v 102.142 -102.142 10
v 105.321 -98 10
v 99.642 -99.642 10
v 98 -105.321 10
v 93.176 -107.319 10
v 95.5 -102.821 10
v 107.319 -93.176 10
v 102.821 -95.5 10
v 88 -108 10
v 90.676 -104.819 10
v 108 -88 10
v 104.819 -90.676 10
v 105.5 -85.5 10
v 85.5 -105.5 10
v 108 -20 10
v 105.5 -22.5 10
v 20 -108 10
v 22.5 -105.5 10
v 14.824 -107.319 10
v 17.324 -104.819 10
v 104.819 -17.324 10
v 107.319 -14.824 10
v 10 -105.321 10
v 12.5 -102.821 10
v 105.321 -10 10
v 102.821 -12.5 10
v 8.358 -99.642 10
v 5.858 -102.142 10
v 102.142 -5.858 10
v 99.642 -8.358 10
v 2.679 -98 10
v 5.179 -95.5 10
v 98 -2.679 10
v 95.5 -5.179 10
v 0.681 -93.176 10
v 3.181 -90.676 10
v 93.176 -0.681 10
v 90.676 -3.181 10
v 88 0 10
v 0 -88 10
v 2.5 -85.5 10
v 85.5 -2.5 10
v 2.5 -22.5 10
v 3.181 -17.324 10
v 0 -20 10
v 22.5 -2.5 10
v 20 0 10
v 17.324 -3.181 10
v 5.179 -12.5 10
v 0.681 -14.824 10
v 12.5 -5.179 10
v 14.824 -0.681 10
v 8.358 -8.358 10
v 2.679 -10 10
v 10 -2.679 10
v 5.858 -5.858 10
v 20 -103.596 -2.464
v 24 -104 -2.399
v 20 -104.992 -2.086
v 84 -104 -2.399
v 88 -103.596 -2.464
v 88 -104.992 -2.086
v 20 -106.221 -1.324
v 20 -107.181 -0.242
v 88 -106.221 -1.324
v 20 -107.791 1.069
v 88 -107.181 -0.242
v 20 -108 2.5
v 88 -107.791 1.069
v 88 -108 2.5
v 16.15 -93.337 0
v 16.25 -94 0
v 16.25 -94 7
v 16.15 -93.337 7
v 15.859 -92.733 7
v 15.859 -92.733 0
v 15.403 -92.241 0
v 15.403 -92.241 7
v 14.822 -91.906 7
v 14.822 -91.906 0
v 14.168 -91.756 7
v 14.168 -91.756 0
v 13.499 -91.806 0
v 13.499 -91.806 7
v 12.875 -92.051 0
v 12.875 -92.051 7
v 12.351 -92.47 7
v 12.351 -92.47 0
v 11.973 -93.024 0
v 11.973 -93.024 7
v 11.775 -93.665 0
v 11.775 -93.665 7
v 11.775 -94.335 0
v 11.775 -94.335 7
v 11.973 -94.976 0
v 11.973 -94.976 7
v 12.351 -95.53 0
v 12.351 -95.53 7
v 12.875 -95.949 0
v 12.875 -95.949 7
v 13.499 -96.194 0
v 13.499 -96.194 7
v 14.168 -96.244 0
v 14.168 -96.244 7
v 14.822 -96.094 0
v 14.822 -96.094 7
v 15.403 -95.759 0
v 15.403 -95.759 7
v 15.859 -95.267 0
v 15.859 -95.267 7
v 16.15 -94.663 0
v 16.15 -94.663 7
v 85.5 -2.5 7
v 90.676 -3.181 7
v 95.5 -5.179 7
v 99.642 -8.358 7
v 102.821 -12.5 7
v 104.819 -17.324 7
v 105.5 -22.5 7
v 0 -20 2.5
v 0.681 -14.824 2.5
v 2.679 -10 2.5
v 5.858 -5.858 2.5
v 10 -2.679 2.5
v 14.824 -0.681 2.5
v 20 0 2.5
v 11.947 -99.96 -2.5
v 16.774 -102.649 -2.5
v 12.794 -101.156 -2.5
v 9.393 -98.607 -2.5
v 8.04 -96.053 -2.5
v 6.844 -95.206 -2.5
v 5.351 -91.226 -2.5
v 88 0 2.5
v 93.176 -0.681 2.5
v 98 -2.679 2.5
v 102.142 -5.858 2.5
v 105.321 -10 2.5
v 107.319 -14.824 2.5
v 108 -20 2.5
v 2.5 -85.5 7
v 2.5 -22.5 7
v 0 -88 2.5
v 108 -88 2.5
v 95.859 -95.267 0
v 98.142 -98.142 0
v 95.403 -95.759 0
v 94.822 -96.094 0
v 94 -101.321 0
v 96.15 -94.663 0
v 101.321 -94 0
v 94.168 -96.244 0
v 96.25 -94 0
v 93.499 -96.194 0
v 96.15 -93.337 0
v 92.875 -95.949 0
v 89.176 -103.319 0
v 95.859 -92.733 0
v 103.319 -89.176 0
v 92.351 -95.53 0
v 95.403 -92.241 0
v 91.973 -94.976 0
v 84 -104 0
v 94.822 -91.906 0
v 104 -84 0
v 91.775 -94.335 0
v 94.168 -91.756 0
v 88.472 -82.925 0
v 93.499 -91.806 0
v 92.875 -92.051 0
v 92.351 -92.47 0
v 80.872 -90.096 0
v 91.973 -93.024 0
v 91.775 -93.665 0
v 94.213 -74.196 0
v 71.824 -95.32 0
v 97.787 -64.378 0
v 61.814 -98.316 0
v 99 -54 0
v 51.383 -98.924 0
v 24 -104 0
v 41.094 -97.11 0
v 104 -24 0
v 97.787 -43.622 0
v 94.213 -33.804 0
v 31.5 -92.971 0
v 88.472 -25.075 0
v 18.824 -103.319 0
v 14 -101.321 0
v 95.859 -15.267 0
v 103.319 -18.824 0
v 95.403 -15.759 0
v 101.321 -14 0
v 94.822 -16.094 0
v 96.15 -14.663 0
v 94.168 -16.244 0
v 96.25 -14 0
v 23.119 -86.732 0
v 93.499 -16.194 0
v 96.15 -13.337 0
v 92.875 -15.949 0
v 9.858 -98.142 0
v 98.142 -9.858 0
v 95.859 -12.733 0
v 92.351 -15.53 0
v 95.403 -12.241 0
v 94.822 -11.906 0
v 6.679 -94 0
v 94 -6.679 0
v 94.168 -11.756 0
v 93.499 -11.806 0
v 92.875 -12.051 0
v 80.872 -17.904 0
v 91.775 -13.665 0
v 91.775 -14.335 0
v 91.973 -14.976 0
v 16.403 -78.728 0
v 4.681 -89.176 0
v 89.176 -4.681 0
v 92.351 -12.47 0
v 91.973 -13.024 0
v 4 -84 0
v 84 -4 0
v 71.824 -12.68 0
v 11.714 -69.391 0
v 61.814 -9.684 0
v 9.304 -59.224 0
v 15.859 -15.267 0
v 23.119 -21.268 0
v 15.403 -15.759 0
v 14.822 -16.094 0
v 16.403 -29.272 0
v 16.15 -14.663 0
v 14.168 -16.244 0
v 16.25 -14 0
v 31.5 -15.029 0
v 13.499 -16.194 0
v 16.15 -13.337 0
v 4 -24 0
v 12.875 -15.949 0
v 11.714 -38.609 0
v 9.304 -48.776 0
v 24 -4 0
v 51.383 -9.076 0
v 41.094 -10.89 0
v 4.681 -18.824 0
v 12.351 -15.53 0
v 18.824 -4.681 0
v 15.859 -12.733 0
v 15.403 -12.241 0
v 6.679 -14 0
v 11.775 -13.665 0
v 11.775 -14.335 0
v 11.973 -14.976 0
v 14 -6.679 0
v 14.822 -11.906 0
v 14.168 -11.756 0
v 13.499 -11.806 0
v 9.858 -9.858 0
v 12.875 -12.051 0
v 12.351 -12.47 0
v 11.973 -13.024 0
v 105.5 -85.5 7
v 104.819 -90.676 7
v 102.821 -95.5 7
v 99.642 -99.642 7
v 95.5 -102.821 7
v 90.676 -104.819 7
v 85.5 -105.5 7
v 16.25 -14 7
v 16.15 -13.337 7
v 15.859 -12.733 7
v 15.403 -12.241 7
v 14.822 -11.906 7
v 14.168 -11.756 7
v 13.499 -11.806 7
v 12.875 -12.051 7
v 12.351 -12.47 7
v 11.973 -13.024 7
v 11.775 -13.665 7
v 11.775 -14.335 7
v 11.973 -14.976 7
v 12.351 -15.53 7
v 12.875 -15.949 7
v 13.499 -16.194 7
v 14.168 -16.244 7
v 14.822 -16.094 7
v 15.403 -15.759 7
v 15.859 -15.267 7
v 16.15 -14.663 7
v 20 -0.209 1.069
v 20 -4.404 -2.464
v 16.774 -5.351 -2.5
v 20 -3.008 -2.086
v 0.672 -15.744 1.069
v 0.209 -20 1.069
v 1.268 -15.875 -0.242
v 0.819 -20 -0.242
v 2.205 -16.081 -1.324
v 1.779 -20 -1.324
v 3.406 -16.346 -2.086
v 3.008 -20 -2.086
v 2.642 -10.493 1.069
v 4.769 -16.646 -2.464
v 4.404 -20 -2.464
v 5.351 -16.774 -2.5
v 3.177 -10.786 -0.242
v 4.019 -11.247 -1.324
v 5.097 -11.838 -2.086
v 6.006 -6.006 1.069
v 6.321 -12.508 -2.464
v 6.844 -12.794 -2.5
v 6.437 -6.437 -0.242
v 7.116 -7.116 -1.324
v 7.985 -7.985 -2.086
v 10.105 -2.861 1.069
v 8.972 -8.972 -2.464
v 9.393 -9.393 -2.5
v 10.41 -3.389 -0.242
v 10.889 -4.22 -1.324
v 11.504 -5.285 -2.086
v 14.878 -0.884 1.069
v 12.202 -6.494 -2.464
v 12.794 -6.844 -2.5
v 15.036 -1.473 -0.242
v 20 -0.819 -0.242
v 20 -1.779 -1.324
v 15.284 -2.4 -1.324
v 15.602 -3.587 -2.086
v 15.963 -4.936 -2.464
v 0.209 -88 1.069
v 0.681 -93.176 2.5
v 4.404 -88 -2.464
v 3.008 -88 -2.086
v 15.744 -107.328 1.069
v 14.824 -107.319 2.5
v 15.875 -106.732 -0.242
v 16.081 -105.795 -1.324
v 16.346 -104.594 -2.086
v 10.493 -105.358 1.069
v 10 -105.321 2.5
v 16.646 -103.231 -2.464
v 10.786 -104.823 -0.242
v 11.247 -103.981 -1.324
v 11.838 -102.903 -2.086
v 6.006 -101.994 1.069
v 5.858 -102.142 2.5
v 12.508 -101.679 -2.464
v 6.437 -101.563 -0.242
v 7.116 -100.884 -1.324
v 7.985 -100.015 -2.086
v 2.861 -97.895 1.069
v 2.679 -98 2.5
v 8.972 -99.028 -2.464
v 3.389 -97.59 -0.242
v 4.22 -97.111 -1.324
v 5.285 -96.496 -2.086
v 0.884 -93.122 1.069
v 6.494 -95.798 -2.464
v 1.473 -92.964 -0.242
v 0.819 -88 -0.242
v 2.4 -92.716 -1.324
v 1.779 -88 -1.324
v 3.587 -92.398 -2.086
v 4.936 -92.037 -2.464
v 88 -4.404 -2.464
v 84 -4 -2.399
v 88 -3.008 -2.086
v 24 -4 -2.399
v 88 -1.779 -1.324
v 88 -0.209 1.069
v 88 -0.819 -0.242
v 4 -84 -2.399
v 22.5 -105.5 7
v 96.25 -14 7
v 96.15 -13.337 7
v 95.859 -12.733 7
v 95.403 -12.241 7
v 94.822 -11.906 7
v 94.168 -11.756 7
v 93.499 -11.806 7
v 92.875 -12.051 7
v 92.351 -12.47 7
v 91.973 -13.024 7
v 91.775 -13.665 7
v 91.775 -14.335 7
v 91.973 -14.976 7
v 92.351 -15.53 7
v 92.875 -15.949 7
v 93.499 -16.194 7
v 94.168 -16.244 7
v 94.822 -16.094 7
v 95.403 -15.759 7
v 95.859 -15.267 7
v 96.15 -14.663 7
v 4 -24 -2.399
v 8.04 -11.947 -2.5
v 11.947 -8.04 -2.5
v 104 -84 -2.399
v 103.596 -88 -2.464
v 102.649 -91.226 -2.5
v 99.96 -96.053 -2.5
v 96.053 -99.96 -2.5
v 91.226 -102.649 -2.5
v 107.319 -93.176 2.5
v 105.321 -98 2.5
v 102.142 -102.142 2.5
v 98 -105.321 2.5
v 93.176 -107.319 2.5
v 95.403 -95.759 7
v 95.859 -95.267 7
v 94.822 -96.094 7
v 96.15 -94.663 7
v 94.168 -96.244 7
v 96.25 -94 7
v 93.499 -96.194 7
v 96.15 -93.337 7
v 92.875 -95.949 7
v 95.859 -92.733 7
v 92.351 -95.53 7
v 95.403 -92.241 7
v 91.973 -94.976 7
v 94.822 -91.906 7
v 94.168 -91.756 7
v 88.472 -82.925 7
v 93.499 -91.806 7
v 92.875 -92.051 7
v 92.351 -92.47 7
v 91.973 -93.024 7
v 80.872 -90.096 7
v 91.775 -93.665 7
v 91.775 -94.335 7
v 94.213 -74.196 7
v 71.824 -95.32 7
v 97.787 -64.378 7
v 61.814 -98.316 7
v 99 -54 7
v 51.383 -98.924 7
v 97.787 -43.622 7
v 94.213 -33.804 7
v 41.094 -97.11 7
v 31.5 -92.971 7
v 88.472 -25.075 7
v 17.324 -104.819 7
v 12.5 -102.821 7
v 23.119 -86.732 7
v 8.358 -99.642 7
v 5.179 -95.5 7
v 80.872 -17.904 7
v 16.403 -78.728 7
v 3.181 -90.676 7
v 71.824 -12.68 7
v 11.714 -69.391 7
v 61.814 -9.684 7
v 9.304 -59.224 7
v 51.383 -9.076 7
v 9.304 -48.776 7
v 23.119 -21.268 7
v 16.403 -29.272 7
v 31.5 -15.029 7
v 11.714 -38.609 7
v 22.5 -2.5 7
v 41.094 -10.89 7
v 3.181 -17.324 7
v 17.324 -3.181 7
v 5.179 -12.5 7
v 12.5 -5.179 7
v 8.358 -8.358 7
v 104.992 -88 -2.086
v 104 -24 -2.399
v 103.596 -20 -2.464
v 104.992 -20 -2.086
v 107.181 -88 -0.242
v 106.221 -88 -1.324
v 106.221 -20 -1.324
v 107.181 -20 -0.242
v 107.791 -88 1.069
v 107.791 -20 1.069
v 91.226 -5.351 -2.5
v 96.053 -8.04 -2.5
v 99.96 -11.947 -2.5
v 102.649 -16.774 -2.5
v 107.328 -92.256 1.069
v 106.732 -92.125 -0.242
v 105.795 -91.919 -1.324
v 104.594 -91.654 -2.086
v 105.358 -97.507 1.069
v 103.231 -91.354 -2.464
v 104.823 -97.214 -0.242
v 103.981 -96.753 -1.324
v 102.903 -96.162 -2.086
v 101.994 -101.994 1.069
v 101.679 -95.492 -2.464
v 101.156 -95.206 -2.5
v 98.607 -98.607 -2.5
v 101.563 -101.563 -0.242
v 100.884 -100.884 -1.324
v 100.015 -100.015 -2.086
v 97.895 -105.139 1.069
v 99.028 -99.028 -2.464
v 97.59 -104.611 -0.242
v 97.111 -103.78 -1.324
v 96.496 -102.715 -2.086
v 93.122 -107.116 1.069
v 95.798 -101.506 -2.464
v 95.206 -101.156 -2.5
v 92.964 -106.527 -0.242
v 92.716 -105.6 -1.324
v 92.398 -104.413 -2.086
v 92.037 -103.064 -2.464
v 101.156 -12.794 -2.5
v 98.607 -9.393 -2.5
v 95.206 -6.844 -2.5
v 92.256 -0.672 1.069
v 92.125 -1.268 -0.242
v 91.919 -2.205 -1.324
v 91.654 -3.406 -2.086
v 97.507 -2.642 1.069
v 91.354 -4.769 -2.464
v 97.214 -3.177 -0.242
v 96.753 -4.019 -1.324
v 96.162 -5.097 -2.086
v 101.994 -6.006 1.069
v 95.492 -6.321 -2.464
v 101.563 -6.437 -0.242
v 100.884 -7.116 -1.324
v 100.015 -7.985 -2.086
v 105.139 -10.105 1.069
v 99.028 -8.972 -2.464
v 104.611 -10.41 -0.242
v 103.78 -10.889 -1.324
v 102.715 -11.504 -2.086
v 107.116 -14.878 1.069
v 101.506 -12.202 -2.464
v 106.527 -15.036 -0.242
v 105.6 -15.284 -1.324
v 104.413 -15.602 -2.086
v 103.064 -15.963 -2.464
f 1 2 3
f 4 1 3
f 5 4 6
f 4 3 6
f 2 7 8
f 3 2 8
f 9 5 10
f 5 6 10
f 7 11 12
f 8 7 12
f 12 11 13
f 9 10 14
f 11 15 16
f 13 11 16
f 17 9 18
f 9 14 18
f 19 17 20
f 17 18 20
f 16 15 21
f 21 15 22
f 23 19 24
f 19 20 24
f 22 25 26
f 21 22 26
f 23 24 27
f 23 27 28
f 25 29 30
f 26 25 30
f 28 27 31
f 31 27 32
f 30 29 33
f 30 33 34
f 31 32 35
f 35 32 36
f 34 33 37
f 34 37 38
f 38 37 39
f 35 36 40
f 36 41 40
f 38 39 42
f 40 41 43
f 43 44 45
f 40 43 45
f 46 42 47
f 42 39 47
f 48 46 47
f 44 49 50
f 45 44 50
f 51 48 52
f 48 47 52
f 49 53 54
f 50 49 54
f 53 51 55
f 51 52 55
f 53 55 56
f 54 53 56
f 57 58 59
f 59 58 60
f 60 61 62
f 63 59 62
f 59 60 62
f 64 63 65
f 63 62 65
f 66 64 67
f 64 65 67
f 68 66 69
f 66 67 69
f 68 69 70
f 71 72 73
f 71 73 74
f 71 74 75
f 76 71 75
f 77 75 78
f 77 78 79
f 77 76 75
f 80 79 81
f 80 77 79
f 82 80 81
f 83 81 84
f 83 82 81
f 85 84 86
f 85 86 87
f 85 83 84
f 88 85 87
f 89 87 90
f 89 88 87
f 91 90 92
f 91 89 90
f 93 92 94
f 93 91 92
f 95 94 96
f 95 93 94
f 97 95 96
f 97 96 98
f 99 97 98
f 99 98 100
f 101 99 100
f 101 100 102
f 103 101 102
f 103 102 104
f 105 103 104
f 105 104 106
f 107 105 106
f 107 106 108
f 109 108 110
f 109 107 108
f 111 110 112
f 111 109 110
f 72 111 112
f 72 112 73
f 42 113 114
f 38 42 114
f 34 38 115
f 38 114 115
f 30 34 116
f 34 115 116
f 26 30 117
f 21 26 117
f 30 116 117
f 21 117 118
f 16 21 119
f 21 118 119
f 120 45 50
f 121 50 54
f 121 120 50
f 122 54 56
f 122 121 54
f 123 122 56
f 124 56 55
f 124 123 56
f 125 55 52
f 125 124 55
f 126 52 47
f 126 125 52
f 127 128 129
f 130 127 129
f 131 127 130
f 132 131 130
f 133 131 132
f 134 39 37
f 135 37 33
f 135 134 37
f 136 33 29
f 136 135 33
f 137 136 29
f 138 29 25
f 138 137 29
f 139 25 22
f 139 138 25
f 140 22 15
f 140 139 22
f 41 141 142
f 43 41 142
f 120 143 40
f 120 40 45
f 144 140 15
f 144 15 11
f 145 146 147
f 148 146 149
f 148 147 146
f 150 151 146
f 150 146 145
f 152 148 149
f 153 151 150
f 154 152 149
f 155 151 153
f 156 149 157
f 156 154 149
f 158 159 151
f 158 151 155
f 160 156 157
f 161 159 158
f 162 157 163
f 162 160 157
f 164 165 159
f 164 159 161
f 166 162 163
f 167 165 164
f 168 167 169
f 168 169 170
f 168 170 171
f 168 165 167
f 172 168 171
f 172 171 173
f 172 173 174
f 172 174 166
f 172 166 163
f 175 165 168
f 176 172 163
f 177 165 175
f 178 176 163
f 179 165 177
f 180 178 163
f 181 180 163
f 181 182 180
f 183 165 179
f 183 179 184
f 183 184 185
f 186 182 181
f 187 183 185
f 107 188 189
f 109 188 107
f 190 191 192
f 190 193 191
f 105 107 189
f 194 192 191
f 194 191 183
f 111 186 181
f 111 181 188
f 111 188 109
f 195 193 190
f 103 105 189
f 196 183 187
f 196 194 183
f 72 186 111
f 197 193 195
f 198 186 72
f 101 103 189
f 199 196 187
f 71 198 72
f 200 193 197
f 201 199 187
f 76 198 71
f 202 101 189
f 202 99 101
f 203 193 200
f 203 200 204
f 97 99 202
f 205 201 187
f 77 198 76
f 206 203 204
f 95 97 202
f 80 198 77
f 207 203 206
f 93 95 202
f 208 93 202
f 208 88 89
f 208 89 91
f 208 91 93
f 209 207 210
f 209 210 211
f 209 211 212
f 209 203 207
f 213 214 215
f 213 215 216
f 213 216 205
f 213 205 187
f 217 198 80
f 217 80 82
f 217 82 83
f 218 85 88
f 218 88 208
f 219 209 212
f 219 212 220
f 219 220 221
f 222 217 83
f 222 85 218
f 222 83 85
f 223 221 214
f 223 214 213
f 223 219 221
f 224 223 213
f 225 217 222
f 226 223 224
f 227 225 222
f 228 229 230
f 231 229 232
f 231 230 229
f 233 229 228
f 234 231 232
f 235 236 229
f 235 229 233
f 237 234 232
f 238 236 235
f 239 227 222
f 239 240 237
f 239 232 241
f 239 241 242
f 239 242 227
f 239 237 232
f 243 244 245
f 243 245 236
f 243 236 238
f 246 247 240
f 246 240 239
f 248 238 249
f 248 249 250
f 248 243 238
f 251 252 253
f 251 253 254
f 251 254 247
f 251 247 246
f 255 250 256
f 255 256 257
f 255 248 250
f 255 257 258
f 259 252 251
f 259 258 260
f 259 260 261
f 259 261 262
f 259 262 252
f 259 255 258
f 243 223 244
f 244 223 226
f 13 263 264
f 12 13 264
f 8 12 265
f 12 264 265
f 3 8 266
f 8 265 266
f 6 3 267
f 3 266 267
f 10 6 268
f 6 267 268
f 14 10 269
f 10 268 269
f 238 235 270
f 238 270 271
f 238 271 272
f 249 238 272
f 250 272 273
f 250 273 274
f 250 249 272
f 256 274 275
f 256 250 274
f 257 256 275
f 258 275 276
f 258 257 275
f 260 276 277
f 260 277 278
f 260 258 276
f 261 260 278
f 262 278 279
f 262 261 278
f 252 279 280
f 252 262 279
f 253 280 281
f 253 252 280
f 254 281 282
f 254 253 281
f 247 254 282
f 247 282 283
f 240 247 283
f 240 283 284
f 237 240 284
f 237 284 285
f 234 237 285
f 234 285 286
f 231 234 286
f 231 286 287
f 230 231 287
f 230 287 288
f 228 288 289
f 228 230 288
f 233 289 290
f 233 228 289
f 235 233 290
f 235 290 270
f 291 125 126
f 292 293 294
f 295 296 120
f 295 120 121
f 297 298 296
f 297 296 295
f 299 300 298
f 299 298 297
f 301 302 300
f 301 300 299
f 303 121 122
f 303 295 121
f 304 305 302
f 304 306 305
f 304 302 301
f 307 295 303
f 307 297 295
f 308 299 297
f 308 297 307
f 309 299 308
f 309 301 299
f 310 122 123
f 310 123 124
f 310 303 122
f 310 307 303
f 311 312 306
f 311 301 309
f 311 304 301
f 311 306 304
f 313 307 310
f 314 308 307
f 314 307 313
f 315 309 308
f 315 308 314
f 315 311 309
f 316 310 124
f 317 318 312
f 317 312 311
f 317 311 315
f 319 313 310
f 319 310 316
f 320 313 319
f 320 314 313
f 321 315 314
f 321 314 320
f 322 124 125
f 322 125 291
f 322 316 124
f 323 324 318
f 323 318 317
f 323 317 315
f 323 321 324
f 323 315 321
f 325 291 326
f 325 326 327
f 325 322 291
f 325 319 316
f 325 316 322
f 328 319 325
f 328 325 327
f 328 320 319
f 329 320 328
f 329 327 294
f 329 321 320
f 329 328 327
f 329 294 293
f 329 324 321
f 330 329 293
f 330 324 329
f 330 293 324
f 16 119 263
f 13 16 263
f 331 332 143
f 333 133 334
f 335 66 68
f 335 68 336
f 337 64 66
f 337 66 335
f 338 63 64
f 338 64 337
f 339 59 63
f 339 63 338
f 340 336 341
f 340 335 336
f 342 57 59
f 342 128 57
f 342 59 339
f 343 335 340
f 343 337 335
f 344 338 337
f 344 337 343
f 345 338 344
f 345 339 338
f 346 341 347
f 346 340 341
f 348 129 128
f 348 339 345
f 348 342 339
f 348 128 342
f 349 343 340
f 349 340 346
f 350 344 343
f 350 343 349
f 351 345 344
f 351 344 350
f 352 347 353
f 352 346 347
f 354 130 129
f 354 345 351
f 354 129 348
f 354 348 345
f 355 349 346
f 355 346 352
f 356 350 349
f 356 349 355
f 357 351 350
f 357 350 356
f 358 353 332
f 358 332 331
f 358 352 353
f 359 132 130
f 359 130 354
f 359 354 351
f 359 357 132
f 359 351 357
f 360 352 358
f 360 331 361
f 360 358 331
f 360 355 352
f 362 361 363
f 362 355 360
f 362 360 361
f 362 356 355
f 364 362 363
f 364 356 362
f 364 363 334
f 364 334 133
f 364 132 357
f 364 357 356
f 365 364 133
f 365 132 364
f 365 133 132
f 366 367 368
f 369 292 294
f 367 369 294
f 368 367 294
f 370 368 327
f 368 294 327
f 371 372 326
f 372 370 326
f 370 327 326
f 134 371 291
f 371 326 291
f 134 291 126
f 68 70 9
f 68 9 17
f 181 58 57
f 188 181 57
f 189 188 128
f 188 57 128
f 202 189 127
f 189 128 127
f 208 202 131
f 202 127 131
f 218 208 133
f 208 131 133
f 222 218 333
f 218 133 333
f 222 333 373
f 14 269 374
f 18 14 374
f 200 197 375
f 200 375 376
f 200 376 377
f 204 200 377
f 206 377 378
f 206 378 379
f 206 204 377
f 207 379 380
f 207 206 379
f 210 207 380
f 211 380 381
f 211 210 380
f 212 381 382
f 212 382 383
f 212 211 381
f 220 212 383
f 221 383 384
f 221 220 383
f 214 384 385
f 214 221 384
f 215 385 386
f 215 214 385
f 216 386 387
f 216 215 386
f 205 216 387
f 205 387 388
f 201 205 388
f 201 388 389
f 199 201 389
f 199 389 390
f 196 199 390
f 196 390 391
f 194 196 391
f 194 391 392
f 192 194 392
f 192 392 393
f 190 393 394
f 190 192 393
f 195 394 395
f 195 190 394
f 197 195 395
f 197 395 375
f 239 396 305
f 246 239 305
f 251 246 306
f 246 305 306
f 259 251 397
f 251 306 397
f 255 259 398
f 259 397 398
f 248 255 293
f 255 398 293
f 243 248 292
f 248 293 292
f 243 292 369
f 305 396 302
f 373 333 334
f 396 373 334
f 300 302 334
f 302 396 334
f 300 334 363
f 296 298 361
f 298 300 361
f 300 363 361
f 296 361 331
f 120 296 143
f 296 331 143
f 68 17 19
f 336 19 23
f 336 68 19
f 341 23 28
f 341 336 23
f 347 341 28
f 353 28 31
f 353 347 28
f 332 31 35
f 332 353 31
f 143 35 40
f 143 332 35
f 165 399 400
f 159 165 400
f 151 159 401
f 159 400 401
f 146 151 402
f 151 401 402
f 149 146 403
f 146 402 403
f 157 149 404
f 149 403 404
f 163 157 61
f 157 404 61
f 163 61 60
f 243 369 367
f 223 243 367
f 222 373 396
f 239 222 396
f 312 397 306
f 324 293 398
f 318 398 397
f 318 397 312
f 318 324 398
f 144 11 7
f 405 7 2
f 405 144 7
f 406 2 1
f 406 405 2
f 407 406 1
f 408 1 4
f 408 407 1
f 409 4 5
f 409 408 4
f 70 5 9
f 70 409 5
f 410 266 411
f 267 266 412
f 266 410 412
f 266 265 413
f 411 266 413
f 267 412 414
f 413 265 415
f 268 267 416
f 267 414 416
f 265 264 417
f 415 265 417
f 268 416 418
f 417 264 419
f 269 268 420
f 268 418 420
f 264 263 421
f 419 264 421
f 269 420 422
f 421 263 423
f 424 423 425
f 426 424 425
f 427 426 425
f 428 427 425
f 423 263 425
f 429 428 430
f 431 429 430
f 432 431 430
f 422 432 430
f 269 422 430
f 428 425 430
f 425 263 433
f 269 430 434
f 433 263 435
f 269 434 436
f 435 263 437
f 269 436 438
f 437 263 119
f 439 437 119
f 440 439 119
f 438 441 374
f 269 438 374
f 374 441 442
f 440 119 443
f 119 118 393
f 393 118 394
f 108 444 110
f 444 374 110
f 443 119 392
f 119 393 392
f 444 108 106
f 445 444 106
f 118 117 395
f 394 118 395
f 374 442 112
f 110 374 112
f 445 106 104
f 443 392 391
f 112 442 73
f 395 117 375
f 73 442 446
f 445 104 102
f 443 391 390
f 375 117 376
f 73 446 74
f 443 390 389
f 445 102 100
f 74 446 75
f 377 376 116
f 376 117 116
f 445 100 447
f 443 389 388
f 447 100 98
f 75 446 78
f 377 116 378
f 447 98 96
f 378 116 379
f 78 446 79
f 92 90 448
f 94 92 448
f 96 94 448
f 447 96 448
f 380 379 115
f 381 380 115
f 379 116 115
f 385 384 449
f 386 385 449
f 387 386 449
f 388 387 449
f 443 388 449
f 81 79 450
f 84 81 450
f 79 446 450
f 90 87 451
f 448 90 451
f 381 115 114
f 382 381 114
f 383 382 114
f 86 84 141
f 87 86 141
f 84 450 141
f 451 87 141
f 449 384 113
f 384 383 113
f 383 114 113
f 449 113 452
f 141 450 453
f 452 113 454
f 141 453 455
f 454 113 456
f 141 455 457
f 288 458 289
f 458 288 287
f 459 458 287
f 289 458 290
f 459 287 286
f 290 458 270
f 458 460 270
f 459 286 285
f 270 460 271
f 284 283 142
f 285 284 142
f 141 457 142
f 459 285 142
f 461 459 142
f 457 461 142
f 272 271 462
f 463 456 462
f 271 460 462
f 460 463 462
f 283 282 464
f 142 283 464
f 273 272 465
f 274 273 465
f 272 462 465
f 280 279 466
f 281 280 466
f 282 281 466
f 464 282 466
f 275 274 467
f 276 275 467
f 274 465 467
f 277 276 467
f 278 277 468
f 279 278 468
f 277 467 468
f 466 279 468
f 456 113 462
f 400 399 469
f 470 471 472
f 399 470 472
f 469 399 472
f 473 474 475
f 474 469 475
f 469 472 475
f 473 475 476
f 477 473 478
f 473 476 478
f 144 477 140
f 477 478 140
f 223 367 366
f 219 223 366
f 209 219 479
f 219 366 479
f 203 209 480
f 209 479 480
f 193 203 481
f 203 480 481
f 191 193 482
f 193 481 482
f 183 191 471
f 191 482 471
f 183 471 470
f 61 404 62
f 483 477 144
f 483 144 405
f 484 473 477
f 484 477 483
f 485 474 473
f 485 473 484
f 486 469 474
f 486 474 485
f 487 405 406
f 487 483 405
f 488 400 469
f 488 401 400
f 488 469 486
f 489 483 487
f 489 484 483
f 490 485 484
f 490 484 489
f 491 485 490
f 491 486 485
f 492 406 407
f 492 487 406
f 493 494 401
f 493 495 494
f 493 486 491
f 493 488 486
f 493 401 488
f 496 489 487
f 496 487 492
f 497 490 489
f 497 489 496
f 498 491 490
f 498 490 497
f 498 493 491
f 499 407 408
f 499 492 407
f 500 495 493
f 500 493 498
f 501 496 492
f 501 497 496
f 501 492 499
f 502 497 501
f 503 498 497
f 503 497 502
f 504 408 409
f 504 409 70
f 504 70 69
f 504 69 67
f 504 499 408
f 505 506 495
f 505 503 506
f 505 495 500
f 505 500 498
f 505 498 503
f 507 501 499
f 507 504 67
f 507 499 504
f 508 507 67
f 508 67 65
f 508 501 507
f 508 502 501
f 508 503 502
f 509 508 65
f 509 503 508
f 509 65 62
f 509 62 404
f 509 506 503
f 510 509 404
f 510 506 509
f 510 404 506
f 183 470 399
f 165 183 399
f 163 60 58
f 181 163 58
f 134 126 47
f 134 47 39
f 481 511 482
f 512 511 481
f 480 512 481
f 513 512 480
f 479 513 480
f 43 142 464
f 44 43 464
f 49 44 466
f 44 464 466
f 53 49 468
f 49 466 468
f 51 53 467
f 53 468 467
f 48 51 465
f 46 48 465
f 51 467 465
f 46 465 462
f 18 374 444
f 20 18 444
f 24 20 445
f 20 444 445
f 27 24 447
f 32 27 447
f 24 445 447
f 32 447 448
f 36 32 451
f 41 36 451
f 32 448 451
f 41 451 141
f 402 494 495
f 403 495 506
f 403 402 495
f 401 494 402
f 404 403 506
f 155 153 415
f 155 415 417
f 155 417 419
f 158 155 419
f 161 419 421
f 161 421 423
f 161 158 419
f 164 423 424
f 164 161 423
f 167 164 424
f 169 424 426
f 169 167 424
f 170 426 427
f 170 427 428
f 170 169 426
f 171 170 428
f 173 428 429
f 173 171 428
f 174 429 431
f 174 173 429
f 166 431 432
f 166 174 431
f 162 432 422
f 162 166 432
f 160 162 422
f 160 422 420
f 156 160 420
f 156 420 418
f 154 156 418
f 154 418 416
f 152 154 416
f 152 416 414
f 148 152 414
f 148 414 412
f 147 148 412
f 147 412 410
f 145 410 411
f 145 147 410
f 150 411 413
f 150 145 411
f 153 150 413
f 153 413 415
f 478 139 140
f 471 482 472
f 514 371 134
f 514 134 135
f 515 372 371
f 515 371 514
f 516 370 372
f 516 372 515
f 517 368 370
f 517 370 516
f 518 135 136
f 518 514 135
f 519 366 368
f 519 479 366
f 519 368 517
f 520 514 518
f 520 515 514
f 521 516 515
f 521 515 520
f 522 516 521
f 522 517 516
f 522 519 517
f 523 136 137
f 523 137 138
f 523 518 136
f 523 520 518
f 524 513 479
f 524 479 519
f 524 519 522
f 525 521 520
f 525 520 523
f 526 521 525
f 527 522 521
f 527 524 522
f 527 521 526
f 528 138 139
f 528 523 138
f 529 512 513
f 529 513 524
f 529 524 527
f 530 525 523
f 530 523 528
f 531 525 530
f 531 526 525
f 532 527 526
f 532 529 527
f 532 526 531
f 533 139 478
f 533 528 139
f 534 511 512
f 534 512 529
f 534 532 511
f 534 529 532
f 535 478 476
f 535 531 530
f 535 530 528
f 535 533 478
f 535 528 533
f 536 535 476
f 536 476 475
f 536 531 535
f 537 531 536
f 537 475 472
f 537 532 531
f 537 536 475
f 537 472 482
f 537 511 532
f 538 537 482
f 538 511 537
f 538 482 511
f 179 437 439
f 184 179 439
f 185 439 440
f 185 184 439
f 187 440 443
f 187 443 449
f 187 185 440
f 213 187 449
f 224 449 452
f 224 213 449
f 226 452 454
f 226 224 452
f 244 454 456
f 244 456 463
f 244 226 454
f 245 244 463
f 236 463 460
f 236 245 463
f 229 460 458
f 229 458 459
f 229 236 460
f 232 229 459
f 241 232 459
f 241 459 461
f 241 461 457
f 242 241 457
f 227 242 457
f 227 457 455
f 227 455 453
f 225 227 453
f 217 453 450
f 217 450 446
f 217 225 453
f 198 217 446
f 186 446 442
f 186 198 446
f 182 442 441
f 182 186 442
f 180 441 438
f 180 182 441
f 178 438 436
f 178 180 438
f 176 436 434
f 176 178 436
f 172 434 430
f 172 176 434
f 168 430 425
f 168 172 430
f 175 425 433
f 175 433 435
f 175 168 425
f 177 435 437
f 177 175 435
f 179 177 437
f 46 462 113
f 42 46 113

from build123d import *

# Parameters (mm, degrees)
ESQUISSE1_R        = 45
ESQUISSE1_R_2      = 2.25
BOSS_EXTRU_1_DEPTH = 7
BOSS_EXTRU_2_DEPTH = 3
BOSS_EXTRU_3_START = 2.5
BOSS_EXTRU_3_DEPTH = 2.5
CONG_1_R           = 5


with BuildPart() as part:
    # Esquisse1 → Boss.-Extru.1 (new body)
    with BuildSketch(Plane.XY):
        with BuildLine():
            Line((20, 0), (88, 0))
            ThreePointArc((88, 0), (102.142135624, -5.857864376), (108, -20))
            Line((108, -20), (108, -88))
            ThreePointArc((108, -88), (102.142135624, -102.142135624), (88, -108))
            Line((88, -108), (20, -108))
            ThreePointArc((20, -108), (5.857864376, -102.142135624), (0, -88))
            Line((0, -88), (0, -20))
            ThreePointArc((0, -20), (5.857864376, -5.857864376), (20, 0))
        make_face()
        with Locations((54, -54)):
            Circle(ESQUISSE1_R, mode=Mode.SUBTRACT)
        with Locations((14, -14)):
            Circle(ESQUISSE1_R_2, mode=Mode.SUBTRACT)
        with Locations((94, -14)):
            Circle(ESQUISSE1_R_2, mode=Mode.SUBTRACT)
        with Locations((94, -94)):
            Circle(ESQUISSE1_R_2, mode=Mode.SUBTRACT)
        with Locations((14, -94)):
            Circle(ESQUISSE1_R_2, mode=Mode.SUBTRACT)
    extrude(amount=BOSS_EXTRU_1_DEPTH)

    # Esquisse2 → Boss.-Extru.2 (add)
    with BuildSketch(Plane.XY.offset(7)):
        with BuildLine():
            Line((20, 0), (88, 0))
            ThreePointArc((88, 0), (102.142135624, -5.857864376), (108, -20))
            Line((108, -20), (108, -88))
            ThreePointArc((108, -88), (102.142135624, -102.142135624), (88, -108))
            Line((88, -108), (20, -108))
            ThreePointArc((20, -108), (5.857864376, -102.142135624), (0, -88))
            Line((0, -88), (0, -20))
            ThreePointArc((0, -20), (5.857864376, -5.857864376), (20, 0))
        make_face()
        with BuildLine():
            Line((22.5, -2.5), (85.5, -2.5))
            ThreePointArc((85.5, -2.5), (99.642135624, -8.357864376), (105.5, -22.5))
            Line((105.5, -22.5), (105.5, -85.5))
            ThreePointArc((105.5, -85.5), (99.642135624, -99.642135624), (85.5, -105.5))
            Line((85.5, -105.5), (22.5, -105.5))
            ThreePointArc((22.5, -105.5), (8.357864376, -99.642135624), (2.5, -85.5))
            Line((2.5, -85.5), (2.5, -22.5))
            ThreePointArc((2.5, -22.5), (8.357864376, -8.357864376), (22.5, -2.5))
        make_face(mode=Mode.SUBTRACT)
    extrude(amount=BOSS_EXTRU_2_DEPTH)

    # Esquisse3 → Boss.-Extru.3 (add)
    with BuildSketch(Plane(origin=(0, 0, 0), x_dir=(-1, 0, 0), z_dir=(0, 0, -1)).offset(BOSS_EXTRU_3_START)):
        with BuildLine():
            Line((-20, 0), (-88, 0))
            ThreePointArc((-88, 0), (-102.142135624, -5.857864376), (-108, -20))
            Line((-108, -20), (-108, -88))
            ThreePointArc((-108, -88), (-102.142135624, -102.142135624), (-88, -108))
            Line((-88, -108), (-20, -108))
            ThreePointArc((-20, -108), (-5.857864376, -102.142135624), (0, -88))
            Line((0, -88), (0, -20))
            ThreePointArc((0, -20), (-5.857864376, -5.857864376), (-20, 0))
        make_face()
        with BuildLine():
            Line((-84, -104), (-24, -104))
            ThreePointArc((-24, -104), (-9.857864376, -98.142135624), (-4, -84))
            Line((-4, -84), (-4, -24))
            ThreePointArc((-4, -24), (-9.857864376, -9.857864376), (-24, -4))
            Line((-24, -4), (-84, -4))
            ThreePointArc((-84, -4), (-98.142135624, -9.857864376), (-104, -24))
            Line((-104, -24), (-104, -84))
            ThreePointArc((-104, -84), (-98.142135624, -98.142135624), (-84, -104))
        make_face(mode=Mode.SUBTRACT)
    extrude(amount=-BOSS_EXTRU_3_DEPTH)

    # Congé1
    # the kernel refuses this fillet: 5 mm, written as the material it takes off along each edge
    with BuildSketch(Plane(origin=(88, -88, -2.5), x_dir=(1, 0, 0), z_dir=(0, 1, 0))) as cong_1_piece_1:
        with BuildLine():
            CenterArc((20 - CONG_1_R, -CONG_1_R), CONG_1_R, 0, 90)
            Line((20 - CONG_1_R, 0), (20, 0))
            Line((20, 0), (20, -CONG_1_R))
        make_face()
    revolve(axis=Axis((88, -88, -2.5), (0, 0, -1)), revolution_arc=90, mode=Mode.SUBTRACT)
    with BuildSketch(Plane(origin=(88, -20, -2.5), x_dir=(0, 1, 0), z_dir=(-1, 0, 0))) as cong_1_piece_2:
        with BuildLine():
            CenterArc((20 - CONG_1_R, -CONG_1_R), CONG_1_R, 0, 90)
            Line((20 - CONG_1_R, 0), (20, 0))
            Line((20, 0), (20, -CONG_1_R))
        make_face()
    revolve(axis=Axis((88, -20, -2.5), (0, 0, -1)), revolution_arc=90, mode=Mode.SUBTRACT)
    with BuildSketch(Plane(origin=(20, -20, -2.5), x_dir=(-1, 0, 0), z_dir=(0, -1, 0))) as cong_1_piece_3:
        with BuildLine():
            CenterArc((20 - CONG_1_R, -CONG_1_R), CONG_1_R, 0, 90)
            Line((20, -CONG_1_R), (20, 0))
            Line((20, 0), (20 - CONG_1_R, 0))
        make_face()
    revolve(axis=Axis((20, -20, -2.5), (0, 0, -1)), revolution_arc=90, mode=Mode.SUBTRACT)
    with BuildSketch(Plane(origin=(20, -88, -2.5), x_dir=(0, -1, 0), z_dir=(1, 0, 0))) as cong_1_piece_4:
        with BuildLine():
            CenterArc((20 - CONG_1_R, -CONG_1_R), CONG_1_R, 0, 90)
            Line((20 - CONG_1_R, 0), (20, 0))
            Line((20, 0), (20, -CONG_1_R))
        make_face()
    revolve(axis=Axis((20, -88, -2.5), (0, 0, -1)), revolution_arc=90, mode=Mode.SUBTRACT)
    with BuildSketch(Plane(origin=(88, -108, -2.5), x_dir=(0, 0, 1), z_dir=(-1, 0, 0)), Plane(origin=(0, -88, -2.5), x_dir=(0, 0, 1), z_dir=(0, 1, 0)), Plane(origin=(20, 0, -2.5), x_dir=(0, 0, 1), z_dir=(1, 0, 0)), Plane(origin=(108, -20, -2.5), x_dir=(0, 0, 1), z_dir=(0, -1, 0))) as cong_1_piece_5:
        with BuildLine():
            CenterArc((CONG_1_R, CONG_1_R), CONG_1_R, 180, 90)
            Line((0, CONG_1_R), (0, 0))
            Line((0, 0), (CONG_1_R, 0))
        make_face()
    extrude(amount=68, mode=Mode.SUBTRACT)


solid = part.part
